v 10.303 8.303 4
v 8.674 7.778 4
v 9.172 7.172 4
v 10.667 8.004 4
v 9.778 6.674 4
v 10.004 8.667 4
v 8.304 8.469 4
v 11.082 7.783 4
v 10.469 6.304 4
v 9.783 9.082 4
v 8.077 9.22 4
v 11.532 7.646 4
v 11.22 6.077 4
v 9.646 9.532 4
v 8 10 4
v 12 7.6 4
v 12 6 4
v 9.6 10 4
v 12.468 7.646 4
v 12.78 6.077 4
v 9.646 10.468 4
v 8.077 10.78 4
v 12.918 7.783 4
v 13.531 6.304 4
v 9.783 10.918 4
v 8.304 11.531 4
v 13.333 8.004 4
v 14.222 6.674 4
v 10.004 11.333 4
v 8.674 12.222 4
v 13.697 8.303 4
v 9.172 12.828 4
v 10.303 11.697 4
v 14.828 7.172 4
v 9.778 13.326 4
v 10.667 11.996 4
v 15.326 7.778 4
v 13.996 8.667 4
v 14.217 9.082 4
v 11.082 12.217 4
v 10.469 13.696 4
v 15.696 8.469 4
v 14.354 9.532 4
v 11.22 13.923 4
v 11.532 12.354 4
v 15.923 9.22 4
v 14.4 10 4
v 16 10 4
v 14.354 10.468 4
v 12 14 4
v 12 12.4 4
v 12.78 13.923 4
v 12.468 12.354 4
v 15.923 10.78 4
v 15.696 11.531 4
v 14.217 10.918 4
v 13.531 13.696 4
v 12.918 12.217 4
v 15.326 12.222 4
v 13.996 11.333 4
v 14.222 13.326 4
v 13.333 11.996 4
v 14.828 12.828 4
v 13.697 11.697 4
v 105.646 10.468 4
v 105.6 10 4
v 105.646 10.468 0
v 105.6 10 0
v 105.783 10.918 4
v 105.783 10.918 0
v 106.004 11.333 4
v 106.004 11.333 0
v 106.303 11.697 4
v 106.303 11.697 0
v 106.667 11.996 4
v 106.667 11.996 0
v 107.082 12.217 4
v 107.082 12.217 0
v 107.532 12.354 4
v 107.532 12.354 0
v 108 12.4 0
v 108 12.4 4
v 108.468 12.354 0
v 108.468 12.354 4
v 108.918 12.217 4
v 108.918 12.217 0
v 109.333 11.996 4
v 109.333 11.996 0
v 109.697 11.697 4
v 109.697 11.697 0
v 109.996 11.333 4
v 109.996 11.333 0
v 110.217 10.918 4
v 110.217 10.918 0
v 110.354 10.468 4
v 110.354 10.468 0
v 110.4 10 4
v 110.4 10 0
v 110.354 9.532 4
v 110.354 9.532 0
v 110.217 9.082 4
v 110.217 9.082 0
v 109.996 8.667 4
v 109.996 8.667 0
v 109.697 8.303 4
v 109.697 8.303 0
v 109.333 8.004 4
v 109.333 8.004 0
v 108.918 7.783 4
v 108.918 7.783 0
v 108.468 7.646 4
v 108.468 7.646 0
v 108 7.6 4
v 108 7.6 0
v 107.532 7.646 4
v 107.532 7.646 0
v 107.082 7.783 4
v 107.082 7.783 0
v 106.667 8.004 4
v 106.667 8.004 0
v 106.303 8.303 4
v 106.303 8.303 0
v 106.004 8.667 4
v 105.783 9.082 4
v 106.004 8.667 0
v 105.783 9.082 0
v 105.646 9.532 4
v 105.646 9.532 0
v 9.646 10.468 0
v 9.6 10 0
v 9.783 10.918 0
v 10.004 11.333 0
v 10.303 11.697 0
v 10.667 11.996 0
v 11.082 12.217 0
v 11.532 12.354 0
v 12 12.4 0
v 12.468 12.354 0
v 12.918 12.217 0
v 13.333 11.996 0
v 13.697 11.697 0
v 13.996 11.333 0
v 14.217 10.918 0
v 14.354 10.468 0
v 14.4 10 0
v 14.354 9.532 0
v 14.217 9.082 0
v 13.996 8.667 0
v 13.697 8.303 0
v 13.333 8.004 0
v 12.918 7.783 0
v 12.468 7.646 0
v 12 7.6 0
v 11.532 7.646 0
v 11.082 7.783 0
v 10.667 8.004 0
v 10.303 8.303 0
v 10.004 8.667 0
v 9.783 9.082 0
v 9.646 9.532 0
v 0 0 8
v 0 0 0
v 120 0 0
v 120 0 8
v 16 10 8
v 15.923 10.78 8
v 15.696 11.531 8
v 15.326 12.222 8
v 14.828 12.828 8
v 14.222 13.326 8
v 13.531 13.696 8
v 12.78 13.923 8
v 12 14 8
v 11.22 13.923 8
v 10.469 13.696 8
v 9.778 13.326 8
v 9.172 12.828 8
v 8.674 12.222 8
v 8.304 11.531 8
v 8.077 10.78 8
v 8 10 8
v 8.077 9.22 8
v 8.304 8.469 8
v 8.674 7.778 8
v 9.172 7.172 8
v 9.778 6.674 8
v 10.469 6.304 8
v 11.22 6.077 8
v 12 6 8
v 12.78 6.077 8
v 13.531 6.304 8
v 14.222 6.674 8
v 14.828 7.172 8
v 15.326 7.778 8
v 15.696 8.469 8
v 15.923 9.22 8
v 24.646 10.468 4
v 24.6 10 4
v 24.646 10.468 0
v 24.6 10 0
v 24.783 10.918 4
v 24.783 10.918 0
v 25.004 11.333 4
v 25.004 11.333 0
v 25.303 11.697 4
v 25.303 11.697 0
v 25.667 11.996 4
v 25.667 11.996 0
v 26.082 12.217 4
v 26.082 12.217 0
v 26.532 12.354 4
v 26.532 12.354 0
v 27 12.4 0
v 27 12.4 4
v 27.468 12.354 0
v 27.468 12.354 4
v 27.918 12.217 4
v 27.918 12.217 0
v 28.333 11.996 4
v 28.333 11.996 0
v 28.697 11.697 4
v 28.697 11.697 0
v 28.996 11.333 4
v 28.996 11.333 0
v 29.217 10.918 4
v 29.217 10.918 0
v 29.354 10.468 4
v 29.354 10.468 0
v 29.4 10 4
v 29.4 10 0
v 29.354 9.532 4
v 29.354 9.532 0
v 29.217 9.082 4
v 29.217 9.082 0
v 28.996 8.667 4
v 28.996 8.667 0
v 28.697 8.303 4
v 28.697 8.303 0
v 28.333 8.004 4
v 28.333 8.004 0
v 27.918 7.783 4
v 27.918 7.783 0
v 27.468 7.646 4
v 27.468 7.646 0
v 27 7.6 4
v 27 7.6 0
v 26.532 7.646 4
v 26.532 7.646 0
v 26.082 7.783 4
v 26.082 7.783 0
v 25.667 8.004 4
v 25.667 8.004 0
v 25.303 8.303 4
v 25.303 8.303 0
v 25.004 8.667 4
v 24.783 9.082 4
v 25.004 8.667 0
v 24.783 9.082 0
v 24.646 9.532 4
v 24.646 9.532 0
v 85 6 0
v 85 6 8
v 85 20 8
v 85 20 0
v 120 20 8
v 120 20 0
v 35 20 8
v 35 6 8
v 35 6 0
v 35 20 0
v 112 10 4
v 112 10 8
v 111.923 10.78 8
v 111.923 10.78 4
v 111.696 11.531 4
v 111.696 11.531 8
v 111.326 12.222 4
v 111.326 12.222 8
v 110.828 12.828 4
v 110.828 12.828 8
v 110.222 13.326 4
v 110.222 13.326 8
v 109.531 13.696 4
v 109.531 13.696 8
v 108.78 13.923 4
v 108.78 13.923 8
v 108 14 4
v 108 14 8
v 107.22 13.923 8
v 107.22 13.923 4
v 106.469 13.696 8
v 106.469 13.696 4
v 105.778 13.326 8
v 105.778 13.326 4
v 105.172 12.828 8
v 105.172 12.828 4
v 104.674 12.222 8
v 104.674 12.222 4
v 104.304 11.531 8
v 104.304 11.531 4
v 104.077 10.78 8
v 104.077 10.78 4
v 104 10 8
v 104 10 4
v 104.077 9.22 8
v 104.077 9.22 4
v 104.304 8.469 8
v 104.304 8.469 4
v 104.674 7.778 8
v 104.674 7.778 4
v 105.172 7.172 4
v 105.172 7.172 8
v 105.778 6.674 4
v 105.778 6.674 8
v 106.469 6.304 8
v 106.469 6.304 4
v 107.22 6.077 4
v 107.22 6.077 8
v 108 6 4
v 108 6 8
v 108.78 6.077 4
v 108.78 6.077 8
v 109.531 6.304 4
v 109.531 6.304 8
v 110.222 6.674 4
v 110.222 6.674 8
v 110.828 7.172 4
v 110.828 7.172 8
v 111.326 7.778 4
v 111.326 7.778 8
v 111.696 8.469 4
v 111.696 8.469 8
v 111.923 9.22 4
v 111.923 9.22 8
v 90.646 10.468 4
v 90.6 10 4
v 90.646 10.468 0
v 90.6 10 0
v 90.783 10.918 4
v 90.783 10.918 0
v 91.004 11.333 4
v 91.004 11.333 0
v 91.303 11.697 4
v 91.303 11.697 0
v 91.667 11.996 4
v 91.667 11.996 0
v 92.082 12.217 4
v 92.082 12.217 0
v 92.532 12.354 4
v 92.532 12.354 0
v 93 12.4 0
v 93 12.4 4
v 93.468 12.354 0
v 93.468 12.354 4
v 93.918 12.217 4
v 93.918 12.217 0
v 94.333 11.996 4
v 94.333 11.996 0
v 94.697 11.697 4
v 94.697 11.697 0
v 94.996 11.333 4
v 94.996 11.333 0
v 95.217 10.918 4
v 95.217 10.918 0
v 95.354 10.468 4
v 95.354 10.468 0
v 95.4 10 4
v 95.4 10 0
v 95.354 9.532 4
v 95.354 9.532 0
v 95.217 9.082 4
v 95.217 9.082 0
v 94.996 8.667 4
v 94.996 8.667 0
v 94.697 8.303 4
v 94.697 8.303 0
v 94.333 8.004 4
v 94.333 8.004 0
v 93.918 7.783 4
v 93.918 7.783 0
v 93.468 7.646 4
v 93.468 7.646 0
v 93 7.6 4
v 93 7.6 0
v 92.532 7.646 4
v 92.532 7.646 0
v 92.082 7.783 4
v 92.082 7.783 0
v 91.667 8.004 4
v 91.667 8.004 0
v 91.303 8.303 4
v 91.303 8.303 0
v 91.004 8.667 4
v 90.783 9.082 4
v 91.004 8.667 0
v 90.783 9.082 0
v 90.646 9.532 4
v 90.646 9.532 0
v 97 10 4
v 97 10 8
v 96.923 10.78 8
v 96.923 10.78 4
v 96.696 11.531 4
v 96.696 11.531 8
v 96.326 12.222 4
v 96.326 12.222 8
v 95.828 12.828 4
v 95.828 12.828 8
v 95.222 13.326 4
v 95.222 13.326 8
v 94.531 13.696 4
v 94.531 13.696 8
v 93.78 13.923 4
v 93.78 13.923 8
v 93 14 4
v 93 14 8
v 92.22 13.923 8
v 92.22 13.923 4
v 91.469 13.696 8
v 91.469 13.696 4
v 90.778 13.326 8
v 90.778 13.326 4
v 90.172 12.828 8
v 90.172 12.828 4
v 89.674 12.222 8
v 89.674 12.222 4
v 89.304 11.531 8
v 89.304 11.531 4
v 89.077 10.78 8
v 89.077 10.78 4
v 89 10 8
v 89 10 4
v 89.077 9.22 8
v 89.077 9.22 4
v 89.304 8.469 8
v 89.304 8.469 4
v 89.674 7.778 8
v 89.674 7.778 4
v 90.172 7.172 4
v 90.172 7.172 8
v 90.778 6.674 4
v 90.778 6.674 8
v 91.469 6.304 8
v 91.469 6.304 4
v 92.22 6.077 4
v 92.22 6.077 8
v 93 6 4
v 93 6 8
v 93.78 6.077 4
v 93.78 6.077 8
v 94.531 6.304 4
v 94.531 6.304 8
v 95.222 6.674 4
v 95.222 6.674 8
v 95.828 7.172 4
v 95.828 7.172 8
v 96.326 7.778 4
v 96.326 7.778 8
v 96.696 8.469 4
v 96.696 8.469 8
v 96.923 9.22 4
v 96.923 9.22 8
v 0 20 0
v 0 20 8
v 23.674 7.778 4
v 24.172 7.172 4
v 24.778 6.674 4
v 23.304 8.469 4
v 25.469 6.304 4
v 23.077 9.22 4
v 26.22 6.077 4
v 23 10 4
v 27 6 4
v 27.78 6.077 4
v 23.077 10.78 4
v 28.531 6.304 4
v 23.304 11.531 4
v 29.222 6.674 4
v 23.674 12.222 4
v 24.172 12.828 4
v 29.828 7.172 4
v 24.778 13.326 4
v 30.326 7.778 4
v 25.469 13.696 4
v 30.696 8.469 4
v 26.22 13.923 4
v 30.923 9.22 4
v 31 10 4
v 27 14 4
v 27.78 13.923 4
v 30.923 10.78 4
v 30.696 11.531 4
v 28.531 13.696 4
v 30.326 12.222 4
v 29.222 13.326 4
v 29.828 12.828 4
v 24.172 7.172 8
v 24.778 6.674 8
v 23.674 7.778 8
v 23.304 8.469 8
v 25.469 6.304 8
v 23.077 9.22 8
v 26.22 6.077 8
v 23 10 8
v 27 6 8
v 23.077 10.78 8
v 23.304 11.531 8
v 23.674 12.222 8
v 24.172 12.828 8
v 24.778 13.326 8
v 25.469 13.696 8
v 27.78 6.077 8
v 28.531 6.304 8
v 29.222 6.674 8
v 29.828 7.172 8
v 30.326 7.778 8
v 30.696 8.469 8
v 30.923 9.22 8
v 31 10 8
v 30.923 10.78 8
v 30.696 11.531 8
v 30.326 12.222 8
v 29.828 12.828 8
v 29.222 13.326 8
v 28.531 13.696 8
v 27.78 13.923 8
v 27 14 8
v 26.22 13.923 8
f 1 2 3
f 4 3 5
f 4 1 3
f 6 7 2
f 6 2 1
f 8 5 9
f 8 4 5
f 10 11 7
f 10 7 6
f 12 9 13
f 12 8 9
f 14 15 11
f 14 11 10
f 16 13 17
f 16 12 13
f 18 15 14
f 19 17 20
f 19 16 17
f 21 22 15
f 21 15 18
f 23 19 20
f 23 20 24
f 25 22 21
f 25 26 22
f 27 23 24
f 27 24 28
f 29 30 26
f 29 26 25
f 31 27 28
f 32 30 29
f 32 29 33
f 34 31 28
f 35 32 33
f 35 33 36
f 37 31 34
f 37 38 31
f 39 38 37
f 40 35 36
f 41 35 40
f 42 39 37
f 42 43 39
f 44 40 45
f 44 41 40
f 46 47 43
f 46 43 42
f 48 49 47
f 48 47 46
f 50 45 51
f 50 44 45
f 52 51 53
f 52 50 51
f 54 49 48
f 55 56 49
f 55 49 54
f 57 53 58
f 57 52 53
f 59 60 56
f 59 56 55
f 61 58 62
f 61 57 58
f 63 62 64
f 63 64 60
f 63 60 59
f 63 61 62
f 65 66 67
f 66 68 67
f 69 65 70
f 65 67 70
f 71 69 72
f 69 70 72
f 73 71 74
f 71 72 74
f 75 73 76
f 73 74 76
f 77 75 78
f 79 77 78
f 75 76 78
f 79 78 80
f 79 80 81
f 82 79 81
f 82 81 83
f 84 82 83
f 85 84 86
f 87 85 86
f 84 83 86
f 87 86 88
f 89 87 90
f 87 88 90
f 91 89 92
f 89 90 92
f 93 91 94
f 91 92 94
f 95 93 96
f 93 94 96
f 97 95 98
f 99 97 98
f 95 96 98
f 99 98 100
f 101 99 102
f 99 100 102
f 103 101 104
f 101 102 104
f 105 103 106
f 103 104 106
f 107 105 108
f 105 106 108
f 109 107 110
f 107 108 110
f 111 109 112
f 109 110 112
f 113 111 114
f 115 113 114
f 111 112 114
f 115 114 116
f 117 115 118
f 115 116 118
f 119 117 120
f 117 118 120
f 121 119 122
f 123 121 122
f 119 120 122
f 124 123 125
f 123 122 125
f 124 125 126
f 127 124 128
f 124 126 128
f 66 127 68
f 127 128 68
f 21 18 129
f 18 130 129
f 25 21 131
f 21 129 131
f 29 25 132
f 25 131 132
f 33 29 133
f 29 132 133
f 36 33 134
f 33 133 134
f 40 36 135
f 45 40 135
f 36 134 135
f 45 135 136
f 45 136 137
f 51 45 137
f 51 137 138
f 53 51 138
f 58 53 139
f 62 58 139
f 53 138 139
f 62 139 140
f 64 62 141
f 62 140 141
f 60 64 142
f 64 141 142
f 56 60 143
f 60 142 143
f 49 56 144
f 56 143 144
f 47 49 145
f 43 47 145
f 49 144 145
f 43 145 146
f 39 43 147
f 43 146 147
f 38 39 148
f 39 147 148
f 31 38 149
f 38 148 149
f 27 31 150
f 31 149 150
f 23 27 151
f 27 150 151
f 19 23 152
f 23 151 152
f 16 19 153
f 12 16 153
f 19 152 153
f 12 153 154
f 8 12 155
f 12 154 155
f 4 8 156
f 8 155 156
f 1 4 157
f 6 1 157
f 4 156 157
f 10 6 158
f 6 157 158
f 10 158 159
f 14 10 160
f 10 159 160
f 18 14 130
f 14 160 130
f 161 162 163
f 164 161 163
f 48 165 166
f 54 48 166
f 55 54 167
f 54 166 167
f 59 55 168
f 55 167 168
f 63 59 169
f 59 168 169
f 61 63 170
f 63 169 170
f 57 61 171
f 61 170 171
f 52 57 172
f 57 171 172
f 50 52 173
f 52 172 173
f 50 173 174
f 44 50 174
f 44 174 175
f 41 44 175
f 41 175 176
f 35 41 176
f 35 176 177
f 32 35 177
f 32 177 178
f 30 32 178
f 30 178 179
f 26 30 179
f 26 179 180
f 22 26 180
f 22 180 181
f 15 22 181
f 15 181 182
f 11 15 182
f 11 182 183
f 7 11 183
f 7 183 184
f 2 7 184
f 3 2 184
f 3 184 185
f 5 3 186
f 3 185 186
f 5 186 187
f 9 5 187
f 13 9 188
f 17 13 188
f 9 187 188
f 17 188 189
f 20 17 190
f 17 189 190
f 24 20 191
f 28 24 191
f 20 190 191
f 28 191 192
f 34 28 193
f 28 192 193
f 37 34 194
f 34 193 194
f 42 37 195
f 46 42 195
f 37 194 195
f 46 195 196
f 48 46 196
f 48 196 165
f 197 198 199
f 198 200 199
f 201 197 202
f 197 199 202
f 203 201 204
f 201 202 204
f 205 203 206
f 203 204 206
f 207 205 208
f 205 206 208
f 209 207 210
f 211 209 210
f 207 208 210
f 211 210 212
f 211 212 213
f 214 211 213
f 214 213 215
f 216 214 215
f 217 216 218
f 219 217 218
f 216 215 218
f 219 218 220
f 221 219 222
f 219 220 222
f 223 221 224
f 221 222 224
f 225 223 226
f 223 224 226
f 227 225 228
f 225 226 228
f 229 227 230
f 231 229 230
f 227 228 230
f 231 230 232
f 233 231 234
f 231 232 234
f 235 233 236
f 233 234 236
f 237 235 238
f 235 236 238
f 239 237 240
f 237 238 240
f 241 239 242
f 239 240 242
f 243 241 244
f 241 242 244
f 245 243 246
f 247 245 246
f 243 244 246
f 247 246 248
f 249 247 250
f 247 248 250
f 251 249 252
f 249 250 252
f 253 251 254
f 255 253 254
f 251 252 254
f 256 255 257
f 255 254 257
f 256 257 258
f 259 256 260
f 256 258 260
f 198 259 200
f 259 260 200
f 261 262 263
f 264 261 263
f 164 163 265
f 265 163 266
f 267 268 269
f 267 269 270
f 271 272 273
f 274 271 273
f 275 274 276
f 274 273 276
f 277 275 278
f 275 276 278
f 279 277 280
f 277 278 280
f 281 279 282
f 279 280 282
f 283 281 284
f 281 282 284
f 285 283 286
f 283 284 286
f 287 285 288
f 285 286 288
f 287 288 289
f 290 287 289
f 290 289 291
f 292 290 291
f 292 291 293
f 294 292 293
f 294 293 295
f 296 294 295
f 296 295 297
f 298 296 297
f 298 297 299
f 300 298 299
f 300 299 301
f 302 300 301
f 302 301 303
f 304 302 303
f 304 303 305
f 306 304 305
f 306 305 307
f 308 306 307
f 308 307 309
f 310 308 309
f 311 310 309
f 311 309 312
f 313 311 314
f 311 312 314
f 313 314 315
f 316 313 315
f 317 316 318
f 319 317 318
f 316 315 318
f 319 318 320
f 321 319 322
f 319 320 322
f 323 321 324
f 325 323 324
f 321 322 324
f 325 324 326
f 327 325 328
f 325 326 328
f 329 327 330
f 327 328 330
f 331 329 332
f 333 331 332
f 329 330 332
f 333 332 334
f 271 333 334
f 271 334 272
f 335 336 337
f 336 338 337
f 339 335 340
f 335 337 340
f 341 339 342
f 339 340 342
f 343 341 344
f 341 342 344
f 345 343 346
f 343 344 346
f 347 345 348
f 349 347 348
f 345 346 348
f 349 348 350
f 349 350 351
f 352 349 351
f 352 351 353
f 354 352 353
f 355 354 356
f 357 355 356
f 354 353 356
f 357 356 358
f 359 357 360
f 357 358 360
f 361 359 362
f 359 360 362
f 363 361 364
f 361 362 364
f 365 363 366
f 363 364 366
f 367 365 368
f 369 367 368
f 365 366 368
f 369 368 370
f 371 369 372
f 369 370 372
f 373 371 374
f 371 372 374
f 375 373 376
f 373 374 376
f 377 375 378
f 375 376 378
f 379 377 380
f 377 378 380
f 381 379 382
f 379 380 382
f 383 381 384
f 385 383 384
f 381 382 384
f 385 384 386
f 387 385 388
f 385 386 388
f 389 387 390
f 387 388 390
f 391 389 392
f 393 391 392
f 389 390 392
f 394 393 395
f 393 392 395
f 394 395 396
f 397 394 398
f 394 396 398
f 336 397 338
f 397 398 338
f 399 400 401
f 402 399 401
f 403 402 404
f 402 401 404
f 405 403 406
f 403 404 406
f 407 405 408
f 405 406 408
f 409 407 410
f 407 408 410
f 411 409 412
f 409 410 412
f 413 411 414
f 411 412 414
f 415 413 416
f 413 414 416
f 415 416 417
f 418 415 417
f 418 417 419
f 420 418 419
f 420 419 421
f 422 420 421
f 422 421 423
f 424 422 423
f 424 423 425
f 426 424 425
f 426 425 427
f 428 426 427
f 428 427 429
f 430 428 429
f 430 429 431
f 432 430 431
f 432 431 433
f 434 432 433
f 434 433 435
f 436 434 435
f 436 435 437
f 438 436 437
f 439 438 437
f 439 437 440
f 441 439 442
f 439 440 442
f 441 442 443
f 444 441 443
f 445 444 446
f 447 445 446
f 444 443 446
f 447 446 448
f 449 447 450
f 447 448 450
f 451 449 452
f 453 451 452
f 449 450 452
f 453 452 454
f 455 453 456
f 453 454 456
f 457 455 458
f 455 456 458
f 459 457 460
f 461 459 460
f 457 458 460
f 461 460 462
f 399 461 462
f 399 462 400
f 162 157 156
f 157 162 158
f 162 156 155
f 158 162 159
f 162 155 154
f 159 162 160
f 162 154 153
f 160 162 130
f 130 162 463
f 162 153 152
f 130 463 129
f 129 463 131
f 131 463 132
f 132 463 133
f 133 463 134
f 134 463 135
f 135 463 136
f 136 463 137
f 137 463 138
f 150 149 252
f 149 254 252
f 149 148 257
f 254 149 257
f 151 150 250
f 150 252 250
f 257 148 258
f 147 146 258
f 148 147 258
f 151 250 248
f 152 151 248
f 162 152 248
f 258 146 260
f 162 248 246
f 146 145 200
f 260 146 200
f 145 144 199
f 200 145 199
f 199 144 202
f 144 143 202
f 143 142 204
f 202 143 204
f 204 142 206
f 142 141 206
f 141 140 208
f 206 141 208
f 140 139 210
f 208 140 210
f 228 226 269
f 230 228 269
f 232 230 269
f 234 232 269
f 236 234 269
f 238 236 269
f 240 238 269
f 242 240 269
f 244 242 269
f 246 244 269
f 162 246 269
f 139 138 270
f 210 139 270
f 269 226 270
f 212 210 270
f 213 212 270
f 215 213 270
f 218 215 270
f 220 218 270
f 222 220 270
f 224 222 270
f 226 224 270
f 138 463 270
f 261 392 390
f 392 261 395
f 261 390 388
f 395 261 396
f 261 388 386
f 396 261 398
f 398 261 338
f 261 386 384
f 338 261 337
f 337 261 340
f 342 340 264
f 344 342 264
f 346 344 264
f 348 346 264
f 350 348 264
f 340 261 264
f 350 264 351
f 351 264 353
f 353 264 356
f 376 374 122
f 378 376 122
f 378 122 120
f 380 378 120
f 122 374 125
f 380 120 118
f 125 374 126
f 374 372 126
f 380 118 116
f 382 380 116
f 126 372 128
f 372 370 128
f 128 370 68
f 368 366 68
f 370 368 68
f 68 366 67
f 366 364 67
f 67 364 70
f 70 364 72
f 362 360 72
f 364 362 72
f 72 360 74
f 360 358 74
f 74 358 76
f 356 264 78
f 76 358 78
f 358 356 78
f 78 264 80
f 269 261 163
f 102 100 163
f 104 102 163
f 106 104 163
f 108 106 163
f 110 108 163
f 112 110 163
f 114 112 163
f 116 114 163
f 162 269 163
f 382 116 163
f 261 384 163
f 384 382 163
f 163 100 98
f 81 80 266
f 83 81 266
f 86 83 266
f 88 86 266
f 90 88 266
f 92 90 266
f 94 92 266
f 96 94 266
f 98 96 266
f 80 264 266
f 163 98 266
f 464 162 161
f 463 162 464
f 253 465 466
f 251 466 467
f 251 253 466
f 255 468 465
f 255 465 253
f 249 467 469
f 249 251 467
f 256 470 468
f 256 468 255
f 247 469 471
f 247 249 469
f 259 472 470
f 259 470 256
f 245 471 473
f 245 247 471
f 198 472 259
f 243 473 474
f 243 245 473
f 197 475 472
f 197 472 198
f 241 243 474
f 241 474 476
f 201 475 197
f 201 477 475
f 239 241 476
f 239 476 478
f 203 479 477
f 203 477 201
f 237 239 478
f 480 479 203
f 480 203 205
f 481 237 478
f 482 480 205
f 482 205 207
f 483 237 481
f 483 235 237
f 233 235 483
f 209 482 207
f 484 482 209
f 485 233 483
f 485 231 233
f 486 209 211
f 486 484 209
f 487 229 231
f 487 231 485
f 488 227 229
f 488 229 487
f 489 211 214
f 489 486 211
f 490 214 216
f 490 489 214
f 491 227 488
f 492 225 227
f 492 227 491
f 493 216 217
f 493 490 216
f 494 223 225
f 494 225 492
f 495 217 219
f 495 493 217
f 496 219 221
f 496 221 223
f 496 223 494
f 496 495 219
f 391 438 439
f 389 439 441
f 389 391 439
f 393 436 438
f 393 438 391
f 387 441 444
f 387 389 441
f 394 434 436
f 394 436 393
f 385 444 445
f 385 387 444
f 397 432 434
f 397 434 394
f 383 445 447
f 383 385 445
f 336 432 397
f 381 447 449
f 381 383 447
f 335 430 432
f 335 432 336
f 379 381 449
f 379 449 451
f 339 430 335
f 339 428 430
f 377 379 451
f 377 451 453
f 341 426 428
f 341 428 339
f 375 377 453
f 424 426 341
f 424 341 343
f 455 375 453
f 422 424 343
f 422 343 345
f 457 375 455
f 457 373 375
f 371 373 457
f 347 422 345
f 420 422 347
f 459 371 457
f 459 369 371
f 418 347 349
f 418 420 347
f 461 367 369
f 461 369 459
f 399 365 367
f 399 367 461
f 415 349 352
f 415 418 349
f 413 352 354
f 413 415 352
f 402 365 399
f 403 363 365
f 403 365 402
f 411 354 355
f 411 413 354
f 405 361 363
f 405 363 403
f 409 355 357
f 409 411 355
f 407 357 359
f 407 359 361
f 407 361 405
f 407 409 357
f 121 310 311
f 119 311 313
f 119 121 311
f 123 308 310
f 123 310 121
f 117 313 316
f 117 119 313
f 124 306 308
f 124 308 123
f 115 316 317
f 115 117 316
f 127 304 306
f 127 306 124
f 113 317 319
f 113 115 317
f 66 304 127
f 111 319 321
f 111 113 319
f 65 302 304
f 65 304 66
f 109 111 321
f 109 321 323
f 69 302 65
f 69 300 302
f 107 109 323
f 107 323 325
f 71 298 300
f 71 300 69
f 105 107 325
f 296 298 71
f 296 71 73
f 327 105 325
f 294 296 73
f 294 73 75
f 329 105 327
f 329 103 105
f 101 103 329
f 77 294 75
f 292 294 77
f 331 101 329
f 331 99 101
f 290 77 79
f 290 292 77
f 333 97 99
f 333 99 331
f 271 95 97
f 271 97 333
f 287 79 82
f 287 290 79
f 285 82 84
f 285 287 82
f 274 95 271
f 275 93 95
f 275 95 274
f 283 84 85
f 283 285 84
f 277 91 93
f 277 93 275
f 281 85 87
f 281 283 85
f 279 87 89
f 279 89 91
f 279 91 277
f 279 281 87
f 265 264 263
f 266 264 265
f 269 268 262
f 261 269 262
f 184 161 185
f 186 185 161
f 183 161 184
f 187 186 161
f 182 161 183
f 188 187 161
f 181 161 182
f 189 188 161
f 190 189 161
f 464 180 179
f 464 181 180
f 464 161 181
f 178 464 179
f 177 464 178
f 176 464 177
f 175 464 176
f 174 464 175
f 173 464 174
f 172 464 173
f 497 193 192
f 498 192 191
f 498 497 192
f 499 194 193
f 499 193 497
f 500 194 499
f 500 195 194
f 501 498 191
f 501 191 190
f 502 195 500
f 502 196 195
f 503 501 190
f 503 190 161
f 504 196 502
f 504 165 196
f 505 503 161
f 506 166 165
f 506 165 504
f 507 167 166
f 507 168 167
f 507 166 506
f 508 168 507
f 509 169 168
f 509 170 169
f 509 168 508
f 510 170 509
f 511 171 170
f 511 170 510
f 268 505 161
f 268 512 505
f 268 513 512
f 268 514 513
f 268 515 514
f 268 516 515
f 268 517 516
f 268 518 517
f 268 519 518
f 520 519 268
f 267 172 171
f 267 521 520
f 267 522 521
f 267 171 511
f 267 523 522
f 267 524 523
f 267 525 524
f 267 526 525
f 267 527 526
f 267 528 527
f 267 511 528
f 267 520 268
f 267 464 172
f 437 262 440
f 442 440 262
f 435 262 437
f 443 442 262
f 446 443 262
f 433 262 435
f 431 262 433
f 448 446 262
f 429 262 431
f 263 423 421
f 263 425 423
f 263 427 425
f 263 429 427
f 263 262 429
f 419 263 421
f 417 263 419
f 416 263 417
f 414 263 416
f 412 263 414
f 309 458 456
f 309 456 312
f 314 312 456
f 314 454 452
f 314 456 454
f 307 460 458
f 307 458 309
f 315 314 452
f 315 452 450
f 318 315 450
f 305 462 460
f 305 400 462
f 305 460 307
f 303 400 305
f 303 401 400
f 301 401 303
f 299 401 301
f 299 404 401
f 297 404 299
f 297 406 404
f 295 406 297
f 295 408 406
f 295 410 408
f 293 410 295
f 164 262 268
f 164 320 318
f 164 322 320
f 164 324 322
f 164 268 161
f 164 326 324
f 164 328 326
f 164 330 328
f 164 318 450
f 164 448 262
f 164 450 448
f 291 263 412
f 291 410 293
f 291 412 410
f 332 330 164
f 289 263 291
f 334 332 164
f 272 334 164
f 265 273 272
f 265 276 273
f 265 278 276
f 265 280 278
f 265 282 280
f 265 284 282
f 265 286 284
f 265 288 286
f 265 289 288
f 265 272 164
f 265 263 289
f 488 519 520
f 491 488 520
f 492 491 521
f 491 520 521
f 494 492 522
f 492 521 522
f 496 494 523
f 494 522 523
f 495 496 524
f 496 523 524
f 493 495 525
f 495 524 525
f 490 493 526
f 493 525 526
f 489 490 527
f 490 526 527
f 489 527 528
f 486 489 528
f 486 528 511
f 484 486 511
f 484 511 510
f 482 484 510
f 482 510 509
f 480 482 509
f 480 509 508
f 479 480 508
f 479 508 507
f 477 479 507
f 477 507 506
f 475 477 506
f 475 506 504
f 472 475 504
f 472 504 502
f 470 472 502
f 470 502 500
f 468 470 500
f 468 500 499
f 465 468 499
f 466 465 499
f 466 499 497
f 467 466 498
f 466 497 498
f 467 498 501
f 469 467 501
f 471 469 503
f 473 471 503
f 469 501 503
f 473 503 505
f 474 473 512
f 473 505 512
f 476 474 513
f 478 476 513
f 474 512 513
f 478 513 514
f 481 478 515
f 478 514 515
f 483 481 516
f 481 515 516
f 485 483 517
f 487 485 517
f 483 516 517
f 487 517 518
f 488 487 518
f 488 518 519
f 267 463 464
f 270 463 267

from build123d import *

# Parameters (mm, degrees)
SKETCH_1_W                   = 120
SKETCH_1_H                   = 20
EXTRUDE_1_DEPTH              = 8
SKETCH_2_W                   = 50
SKETCH_2_H                   = 14
CUT_EXTRUDE_1_DEPTH          = 122.918005233
HOLE_WIZARD_M4_1_D           = 4.8
HOLE_WIZARD_M4_1_CBORE_D     = 8
HOLE_WIZARD_M4_1_CBORE_DEPTH = 4


with BuildPart() as part:
    # 草图1 → 凸台-拉伸1 (new body)
    with BuildSketch(Plane.XY):
        with Locations((60, 10)):
            Rectangle(SKETCH_1_W, SKETCH_1_H)
    extrude(amount=EXTRUDE_1_DEPTH)

    # 草图2 → 切除-拉伸1 (cut, through all)
    with BuildSketch(Plane.XY.offset(8)):
        with Locations((60, 13)):
            Rectangle(SKETCH_2_W, SKETCH_2_H)
    extrude(amount=-CUT_EXTRUDE_1_DEPTH, mode=Mode.SUBTRACT)

    # M4 六角凹头螺钉的柱形沉头孔1 (through all)
    with Locations(Plane.XY.offset(8)):
        with Locations((12, 10), (27, 10), (93, 10), (108, 10)):
            CounterBoreHole(HOLE_WIZARD_M4_1_D / 2, HOLE_WIZARD_M4_1_CBORE_D / 2, HOLE_WIZARD_M4_1_CBORE_DEPTH)


solid = part.part
